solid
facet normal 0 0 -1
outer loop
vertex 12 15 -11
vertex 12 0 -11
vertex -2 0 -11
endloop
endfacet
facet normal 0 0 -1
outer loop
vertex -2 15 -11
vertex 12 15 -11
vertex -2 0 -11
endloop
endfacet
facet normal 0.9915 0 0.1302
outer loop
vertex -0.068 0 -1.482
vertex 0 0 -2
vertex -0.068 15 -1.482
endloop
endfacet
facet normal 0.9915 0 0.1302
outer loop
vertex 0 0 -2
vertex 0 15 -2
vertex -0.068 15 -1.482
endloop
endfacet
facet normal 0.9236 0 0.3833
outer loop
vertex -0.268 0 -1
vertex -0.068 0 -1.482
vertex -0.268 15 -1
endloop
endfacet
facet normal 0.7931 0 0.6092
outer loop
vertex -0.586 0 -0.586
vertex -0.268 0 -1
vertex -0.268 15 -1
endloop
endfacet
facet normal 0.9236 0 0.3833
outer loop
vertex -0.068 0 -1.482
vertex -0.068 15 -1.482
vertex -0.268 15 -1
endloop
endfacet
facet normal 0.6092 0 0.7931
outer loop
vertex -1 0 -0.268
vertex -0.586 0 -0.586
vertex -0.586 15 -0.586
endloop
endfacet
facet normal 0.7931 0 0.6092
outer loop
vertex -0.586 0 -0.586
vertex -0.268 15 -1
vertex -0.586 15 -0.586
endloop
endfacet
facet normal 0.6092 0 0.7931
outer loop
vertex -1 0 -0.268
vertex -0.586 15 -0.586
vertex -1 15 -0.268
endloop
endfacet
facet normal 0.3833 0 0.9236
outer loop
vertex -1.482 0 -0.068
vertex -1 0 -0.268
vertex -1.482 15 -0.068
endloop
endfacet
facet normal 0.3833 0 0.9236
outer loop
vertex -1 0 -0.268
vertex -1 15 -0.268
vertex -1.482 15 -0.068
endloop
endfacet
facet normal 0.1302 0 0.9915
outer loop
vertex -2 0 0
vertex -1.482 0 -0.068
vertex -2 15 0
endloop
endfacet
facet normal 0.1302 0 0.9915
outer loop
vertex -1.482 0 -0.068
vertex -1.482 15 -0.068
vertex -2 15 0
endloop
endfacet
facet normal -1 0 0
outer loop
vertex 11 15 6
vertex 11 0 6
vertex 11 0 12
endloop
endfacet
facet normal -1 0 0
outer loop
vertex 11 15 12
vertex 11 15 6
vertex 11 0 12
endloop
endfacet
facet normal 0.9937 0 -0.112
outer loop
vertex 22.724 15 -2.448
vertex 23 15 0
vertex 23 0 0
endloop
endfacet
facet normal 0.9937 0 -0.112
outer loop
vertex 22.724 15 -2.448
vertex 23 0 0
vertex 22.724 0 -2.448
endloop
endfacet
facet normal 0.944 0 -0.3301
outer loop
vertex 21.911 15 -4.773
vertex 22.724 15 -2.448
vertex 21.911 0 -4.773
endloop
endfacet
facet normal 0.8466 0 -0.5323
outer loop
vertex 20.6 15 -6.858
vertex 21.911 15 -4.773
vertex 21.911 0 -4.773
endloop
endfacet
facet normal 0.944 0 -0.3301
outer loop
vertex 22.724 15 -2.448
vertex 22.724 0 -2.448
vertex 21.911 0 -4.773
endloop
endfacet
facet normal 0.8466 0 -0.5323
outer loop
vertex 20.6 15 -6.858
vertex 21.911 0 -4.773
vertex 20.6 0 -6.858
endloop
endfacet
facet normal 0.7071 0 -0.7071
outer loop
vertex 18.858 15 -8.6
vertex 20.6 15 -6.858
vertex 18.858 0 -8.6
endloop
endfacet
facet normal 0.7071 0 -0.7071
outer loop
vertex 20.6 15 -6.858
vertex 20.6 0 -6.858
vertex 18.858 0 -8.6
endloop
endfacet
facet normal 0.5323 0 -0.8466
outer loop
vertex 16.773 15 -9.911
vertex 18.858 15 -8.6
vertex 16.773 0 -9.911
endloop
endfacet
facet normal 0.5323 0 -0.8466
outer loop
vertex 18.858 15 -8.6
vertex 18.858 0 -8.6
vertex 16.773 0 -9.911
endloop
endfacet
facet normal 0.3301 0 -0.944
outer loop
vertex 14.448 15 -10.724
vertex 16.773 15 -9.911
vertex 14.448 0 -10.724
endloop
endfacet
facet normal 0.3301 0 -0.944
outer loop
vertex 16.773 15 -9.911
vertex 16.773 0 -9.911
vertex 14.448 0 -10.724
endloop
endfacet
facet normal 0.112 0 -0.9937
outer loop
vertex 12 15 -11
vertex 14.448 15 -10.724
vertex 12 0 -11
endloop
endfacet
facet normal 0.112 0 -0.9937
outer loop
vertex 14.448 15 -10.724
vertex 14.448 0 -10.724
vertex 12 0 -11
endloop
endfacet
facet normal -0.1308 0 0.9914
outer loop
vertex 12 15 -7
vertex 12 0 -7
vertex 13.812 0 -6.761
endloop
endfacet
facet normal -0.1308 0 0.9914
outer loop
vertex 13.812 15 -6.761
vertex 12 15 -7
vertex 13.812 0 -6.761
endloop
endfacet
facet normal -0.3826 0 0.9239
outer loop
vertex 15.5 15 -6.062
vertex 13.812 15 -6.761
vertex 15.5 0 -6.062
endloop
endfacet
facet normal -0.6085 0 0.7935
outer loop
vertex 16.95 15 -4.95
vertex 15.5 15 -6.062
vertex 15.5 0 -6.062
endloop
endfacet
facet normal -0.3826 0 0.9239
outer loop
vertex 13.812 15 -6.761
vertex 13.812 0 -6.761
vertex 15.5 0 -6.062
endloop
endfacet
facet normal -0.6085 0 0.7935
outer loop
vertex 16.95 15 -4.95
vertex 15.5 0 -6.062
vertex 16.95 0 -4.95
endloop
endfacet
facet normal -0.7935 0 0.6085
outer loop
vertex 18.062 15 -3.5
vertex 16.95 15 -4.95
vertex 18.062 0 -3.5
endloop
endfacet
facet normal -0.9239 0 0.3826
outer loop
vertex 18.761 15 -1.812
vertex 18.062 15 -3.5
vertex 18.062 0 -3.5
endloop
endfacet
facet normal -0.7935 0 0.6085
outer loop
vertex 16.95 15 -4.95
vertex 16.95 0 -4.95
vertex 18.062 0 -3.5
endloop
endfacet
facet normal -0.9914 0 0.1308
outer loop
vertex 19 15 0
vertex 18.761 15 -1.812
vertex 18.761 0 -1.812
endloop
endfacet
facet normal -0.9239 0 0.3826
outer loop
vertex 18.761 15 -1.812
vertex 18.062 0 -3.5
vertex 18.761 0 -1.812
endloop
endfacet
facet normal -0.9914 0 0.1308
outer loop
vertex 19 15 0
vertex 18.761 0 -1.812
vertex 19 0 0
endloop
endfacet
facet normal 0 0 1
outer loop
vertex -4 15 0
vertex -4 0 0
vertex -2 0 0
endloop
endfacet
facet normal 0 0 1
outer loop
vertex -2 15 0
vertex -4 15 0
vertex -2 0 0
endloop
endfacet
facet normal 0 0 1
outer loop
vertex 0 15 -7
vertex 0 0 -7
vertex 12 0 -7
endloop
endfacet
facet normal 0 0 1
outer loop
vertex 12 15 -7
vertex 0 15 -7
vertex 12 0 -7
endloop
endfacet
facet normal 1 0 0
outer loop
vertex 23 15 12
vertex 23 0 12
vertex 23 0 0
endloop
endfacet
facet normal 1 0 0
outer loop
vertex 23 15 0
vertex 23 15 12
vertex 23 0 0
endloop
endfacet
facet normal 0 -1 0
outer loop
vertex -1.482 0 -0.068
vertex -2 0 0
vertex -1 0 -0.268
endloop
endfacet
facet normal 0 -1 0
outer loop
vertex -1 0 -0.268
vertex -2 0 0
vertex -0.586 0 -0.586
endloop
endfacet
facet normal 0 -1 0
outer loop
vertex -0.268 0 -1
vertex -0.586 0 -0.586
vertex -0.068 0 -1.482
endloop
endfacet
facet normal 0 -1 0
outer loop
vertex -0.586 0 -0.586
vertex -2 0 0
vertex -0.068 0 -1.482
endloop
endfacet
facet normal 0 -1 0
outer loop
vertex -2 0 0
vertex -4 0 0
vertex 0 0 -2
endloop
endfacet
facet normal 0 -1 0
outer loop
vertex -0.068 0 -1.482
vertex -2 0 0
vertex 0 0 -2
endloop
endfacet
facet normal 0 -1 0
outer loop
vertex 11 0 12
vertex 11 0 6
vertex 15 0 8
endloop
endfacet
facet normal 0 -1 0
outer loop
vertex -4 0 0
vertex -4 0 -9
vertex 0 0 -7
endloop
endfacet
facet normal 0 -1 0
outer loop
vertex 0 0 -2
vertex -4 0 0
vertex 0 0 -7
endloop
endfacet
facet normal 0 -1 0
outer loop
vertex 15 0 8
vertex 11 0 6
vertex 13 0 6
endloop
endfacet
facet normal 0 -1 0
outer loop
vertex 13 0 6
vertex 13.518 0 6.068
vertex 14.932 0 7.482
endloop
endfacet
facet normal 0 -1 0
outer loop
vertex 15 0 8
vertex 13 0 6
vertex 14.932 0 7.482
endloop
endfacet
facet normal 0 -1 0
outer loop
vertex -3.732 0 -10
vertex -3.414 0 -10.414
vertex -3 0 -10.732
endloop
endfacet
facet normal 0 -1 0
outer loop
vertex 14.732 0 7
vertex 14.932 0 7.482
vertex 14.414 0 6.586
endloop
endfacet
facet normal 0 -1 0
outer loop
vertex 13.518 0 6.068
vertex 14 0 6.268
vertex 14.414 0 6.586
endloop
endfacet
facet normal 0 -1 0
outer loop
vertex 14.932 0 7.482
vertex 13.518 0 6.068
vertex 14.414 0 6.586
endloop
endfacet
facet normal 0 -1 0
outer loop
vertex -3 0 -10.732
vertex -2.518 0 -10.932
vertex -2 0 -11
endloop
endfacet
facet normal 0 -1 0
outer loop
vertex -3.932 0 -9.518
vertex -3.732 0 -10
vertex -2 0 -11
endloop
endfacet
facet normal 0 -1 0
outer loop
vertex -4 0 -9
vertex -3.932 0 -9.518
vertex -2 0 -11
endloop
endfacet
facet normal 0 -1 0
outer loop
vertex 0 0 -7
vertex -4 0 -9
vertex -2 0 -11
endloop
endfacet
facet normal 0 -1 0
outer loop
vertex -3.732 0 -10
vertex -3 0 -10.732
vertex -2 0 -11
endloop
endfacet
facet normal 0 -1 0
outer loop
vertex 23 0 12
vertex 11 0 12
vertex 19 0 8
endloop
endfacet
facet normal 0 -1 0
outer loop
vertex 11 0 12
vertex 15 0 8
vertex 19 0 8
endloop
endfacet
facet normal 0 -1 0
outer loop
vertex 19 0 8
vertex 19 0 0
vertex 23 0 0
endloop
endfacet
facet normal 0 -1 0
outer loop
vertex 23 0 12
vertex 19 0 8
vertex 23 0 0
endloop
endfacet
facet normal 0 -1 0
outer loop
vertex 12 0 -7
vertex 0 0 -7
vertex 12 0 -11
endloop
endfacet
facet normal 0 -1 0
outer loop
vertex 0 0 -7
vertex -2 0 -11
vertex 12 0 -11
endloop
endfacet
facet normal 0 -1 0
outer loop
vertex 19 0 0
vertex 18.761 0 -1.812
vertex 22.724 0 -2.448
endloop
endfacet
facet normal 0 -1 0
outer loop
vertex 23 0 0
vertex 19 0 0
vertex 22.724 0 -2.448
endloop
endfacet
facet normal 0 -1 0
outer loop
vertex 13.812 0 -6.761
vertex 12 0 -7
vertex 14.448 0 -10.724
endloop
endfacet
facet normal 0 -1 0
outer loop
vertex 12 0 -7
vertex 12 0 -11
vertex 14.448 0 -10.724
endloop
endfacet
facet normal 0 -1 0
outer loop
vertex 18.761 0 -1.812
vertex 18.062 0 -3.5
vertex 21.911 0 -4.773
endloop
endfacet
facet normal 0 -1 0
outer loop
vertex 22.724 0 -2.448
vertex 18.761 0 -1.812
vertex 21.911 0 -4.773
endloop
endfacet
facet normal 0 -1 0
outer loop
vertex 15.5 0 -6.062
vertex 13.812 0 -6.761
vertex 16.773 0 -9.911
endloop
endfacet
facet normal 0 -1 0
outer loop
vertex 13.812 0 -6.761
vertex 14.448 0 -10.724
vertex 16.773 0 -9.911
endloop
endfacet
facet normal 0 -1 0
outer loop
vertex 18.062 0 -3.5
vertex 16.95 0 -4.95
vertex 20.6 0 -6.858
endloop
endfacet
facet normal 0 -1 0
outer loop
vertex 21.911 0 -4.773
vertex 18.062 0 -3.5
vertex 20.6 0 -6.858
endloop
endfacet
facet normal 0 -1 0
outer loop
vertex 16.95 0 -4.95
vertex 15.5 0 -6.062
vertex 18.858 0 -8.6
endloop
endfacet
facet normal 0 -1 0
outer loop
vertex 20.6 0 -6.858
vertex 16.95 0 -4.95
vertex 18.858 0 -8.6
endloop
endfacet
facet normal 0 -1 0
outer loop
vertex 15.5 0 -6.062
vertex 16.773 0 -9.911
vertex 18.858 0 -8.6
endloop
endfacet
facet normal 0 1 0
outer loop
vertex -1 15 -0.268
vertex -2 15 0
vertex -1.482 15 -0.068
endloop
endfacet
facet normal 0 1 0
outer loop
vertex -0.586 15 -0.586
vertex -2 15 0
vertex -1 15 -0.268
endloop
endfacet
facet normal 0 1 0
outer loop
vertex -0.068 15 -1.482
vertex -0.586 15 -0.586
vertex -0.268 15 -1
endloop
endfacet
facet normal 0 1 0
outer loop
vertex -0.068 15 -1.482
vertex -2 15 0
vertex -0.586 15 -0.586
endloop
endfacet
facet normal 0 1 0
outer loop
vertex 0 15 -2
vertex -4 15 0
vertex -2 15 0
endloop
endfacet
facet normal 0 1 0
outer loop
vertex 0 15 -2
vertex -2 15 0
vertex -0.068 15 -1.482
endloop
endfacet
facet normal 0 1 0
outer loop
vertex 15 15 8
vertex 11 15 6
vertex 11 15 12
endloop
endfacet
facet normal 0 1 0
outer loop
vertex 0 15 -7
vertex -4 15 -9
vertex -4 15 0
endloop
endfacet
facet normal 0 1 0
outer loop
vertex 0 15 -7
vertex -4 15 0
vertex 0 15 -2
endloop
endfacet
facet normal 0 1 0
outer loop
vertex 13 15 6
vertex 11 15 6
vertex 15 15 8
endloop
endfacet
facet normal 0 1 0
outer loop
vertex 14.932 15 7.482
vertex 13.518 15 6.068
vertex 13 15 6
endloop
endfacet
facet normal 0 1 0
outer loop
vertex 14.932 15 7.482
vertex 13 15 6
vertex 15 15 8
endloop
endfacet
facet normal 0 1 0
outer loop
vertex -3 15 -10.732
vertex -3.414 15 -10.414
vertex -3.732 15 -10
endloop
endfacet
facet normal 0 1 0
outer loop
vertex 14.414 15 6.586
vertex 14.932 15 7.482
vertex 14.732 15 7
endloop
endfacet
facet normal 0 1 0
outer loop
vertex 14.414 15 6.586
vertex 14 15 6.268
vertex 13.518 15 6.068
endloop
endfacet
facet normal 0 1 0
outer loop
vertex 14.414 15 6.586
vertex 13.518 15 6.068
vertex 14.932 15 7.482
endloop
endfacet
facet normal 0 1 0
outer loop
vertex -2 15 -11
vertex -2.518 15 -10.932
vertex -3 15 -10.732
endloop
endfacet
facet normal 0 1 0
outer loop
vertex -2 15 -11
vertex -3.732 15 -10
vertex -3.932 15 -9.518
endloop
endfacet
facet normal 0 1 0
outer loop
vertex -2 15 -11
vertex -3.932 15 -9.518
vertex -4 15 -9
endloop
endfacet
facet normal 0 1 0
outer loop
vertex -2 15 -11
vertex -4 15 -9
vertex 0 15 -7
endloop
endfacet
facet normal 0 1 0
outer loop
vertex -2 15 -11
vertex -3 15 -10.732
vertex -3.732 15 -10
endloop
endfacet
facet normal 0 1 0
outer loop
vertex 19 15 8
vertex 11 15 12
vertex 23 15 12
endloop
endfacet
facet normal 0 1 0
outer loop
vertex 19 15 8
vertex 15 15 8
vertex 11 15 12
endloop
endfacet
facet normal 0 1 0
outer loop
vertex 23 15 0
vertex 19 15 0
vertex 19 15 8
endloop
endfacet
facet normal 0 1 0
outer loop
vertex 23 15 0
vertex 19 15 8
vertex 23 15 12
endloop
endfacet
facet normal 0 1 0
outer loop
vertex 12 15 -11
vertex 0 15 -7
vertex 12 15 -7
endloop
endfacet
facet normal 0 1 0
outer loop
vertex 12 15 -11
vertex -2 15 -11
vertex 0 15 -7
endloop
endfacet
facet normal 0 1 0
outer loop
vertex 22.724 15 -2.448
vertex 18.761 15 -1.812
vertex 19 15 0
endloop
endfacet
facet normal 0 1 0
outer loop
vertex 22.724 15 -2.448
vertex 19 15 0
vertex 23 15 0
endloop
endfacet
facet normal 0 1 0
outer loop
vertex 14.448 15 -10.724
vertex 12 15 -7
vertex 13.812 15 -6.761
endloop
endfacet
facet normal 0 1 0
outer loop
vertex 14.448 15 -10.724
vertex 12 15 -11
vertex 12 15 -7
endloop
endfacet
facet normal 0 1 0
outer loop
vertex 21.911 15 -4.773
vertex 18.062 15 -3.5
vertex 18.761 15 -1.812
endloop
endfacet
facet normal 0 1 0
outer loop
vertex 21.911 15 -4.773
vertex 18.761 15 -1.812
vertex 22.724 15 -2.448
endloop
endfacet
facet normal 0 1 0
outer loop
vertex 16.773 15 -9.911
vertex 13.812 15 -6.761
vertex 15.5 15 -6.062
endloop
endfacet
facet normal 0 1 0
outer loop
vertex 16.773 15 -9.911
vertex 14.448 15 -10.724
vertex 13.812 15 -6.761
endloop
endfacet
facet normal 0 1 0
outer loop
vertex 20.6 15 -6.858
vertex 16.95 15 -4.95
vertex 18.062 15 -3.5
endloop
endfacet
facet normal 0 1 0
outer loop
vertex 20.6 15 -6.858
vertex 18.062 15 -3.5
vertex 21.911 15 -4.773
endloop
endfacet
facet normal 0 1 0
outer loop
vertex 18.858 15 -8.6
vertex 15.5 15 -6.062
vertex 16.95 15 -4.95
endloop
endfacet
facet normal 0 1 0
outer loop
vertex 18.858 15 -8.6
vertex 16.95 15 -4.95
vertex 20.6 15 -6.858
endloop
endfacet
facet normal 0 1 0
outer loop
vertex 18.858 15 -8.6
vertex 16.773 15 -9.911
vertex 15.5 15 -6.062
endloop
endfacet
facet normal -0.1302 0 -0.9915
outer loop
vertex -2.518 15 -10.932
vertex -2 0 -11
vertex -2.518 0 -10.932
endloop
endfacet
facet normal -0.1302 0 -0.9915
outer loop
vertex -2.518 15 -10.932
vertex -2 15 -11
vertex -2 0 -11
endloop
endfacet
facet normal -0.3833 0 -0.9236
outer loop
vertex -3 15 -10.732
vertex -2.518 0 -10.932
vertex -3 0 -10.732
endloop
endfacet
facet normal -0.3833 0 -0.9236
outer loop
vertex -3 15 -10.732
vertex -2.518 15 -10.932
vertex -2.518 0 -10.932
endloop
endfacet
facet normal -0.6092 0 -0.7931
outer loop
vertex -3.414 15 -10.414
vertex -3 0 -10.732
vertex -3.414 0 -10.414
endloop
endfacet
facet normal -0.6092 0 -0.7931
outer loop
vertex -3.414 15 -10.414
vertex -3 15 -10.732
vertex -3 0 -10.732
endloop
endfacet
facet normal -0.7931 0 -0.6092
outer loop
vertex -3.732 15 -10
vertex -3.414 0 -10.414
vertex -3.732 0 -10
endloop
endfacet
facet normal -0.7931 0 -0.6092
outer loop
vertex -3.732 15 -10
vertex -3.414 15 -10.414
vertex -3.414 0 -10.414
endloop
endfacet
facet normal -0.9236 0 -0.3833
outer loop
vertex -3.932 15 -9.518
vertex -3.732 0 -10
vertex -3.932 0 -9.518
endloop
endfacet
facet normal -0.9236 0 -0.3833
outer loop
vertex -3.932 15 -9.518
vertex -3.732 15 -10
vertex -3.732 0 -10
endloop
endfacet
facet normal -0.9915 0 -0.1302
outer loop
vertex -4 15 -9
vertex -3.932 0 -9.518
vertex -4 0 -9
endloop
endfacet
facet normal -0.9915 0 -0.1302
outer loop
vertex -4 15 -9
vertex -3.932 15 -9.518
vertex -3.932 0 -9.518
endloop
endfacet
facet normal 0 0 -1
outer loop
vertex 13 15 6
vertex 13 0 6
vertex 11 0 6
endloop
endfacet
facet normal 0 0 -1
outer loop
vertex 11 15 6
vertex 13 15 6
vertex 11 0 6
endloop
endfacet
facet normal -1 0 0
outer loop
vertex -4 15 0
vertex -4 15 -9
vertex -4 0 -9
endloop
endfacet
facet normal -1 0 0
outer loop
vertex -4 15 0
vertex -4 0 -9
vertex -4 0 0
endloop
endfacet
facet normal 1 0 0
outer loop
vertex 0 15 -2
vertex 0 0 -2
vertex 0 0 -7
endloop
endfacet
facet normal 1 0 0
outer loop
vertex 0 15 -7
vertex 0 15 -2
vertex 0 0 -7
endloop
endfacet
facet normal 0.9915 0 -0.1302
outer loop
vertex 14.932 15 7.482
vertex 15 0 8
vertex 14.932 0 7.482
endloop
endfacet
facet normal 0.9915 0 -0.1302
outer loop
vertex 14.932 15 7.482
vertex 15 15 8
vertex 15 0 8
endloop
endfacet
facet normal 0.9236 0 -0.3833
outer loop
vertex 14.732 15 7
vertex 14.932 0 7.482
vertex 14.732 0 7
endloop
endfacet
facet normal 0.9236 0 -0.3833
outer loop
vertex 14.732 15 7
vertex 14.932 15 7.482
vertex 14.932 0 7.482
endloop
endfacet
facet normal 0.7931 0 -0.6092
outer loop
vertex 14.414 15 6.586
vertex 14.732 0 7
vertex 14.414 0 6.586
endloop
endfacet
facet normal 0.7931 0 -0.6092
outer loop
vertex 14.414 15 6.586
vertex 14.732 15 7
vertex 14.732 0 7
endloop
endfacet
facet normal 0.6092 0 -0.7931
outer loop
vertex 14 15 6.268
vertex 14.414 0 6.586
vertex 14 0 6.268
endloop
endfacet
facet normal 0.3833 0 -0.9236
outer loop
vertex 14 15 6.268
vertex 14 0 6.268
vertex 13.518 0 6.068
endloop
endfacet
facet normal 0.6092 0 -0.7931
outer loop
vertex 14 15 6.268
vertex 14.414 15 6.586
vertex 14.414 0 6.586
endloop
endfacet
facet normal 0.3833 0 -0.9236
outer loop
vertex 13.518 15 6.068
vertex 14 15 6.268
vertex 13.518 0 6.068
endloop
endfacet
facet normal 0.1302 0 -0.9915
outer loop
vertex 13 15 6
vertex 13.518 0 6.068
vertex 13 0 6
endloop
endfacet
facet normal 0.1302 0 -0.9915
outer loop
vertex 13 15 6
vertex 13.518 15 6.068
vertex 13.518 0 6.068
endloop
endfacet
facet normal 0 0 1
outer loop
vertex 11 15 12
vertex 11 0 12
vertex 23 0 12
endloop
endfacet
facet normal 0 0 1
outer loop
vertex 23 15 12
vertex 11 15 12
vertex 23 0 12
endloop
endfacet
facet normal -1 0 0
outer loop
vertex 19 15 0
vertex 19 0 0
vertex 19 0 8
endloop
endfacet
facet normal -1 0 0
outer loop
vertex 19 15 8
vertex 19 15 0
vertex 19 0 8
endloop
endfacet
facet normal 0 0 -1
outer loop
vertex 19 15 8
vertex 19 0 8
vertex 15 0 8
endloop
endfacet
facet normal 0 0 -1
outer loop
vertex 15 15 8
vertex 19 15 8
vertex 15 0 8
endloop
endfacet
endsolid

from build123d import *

# Parameters (mm, degrees)
BOSS_EXTRUDE1_DEPTH = 15
FILLET1_R           = 2


with BuildPart() as part:
    # Sketch1 → Boss-Extrude1 (new body)
    with BuildSketch(Plane(origin=(0, 0, 0), x_dir=(1, 0, 0), z_dir=(0, 1, 0))):
        with BuildLine():
            Line((0, 0), (0, 7))
            Line((0, 7), (12, 7))
            ThreePointArc((12, 7), (16.949747468, 4.949747468), (19, 0))
            Line((19, 0), (19, -8))
            Line((19, -8), (15, -8))
            Line((15, -8), (15, -6))
            Line((15, -6), (11, -6))
            Line((11, -6), (11, -12))
            Line((11, -12), (23, -12))
            Line((23, -12), (23, 0))
            ThreePointArc((23, 0), (19.778174593, 7.778174593), (12, 11))
            Line((12, 11), (-4, 11))
            Line((-4, 11), (-4, 0))
            Line((-4, 0), (0, 0))
        make_face()
    extrude(amount=BOSS_EXTRUDE1_DEPTH)

    # Fillet1
    fillet1_edges = [part.edges().sort_by_distance(p)[0] for p in [
        (15, 7.5, 6),
        (0, 7.5, 0),
        (-4, 7.5, -11),
    ]]
    fillet(fillet1_edges, radius=FILLET1_R - 0.0001)  # a hair under: the kernel refuses the full size


solid = part.part
